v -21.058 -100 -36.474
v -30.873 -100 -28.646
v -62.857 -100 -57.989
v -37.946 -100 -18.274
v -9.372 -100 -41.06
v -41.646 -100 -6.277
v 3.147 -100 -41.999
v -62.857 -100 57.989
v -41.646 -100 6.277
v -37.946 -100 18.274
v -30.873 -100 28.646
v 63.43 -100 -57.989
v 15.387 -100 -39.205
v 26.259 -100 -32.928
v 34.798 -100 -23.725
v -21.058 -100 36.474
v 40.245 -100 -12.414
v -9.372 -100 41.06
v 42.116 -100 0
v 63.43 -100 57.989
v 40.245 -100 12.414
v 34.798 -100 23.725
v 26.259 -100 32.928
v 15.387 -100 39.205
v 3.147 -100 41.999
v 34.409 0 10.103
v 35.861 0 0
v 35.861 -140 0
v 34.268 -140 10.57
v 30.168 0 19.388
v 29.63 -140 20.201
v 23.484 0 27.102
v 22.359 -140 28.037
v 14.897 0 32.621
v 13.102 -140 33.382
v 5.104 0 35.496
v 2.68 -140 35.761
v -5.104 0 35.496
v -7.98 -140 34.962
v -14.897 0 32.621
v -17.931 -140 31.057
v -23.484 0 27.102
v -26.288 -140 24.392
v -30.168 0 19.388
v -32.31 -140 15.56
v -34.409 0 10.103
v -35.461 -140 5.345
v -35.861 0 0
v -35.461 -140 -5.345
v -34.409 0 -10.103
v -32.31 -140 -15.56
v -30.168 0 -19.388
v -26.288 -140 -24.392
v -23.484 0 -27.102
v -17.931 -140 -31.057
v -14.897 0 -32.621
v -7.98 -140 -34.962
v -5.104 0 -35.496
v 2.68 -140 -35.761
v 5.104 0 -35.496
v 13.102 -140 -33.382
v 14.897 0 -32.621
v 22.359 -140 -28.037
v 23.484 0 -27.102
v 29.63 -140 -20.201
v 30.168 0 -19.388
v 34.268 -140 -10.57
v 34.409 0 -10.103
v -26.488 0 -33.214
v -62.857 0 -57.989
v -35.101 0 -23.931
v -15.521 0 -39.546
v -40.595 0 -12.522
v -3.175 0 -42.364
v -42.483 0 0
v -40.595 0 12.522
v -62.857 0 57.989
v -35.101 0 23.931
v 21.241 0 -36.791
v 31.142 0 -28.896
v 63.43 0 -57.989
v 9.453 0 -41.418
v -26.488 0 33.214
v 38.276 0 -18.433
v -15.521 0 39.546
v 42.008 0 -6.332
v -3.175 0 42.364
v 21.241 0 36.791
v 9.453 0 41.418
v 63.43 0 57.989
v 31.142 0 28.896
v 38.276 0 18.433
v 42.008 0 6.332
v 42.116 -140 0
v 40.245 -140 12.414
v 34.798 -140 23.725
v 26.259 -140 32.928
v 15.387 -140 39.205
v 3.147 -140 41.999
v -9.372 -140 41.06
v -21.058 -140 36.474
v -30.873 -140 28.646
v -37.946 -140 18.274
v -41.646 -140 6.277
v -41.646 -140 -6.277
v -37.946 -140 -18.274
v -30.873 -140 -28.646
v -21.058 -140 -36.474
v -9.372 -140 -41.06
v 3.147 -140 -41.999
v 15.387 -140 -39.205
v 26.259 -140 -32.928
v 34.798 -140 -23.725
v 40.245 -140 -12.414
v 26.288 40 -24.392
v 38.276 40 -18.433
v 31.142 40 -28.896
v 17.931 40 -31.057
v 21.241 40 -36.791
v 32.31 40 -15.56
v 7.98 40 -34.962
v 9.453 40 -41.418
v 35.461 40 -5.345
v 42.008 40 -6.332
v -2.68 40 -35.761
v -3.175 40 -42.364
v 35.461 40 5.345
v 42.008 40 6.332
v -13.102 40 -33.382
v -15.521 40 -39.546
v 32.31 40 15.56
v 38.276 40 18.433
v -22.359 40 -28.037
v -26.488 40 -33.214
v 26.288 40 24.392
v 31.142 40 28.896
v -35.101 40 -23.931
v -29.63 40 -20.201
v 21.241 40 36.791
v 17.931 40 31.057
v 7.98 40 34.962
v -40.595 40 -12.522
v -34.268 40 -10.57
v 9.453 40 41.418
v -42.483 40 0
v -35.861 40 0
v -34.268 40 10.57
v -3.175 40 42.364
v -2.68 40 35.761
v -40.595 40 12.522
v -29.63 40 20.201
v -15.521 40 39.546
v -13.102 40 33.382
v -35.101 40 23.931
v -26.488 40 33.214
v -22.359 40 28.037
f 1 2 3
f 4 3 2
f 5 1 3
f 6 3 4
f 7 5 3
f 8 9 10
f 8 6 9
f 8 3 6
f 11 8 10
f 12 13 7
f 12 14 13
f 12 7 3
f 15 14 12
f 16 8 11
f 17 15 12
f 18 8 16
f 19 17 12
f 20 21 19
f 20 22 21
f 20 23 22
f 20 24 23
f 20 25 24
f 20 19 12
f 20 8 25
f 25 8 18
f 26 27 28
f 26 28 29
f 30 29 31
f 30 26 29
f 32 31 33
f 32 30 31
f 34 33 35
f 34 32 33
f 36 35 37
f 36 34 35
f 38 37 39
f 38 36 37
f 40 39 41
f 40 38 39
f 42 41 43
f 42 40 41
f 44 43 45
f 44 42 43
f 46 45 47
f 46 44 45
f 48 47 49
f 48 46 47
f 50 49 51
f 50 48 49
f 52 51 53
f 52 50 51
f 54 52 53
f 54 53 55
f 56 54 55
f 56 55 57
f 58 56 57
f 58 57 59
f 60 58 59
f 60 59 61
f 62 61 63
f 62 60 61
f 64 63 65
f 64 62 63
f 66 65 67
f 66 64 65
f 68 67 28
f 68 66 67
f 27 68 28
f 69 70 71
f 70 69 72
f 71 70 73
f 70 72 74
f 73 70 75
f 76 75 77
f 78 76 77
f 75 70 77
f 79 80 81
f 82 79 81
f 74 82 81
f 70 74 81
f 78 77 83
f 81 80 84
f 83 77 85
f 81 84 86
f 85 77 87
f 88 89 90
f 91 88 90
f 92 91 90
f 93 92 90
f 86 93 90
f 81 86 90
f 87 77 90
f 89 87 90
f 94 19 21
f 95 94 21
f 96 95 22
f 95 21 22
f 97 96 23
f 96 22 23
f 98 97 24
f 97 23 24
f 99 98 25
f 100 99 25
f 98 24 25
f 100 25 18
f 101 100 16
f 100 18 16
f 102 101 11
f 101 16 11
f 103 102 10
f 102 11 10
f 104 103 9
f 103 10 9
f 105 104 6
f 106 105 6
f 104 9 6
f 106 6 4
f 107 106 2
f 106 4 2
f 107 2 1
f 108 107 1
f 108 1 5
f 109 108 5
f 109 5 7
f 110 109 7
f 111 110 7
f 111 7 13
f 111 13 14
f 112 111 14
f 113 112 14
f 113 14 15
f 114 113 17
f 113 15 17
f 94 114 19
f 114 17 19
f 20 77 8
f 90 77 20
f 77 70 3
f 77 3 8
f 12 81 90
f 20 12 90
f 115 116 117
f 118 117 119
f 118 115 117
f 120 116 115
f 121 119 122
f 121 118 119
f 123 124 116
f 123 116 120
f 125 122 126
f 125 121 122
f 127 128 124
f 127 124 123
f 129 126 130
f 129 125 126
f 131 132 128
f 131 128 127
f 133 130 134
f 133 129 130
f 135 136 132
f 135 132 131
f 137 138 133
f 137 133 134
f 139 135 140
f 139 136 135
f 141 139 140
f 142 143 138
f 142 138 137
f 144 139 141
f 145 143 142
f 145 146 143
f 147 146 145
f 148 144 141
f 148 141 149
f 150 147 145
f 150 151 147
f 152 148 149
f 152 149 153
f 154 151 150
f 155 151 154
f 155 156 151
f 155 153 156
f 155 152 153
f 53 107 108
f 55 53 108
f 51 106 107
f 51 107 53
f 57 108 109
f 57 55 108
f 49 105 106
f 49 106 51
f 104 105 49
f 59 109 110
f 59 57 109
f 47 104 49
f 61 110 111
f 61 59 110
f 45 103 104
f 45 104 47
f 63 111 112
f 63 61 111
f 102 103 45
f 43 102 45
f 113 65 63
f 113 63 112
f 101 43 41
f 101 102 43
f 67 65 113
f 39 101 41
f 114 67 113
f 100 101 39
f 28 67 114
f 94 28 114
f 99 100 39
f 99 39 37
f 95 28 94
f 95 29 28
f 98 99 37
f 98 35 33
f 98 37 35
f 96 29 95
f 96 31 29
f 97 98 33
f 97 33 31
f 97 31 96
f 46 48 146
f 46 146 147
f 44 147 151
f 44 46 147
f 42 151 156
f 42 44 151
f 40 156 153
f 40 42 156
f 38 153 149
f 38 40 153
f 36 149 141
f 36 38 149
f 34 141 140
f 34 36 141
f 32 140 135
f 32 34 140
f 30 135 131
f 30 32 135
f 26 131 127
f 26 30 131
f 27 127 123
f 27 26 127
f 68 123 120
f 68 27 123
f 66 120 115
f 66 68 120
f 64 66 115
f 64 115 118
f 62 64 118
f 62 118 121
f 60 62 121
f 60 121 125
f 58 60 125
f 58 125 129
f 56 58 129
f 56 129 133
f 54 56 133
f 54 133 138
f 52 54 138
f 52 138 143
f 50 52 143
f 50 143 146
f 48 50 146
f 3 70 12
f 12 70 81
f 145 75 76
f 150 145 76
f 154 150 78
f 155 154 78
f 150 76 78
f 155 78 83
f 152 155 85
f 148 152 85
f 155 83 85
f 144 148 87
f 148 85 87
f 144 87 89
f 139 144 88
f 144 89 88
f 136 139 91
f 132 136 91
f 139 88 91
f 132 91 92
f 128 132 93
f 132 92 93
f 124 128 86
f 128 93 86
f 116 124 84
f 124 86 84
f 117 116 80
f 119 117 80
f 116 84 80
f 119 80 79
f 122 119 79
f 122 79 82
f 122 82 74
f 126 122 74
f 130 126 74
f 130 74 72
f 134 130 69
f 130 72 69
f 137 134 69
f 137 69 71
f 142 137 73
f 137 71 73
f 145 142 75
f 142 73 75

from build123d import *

# Parameters (mm, degrees)
F0_W     = 126.286372
F0_H     = 115.97728
F0_R     = 35.861257
F1_DEPTH = 100
F2_R     = 42.116392
F2_R_2   = 35.861257
F3_DEPTH = 40
F4_R     = 42.482799
F4_R_2   = 35.861257
F5_DEPTH = 40


with BuildPart() as f1:
    # F0 (on Front) → F1 (new body)
    with BuildSketch(Plane.XZ):
        with Locations((0.286363, 0)):
            Rectangle(F0_W, F0_H)
        Circle(F0_R, mode=Mode.SUBTRACT)
    extrude(amount=F1_DEPTH)

    # F2 (on face) → F3 (join)
    with BuildSketch(Plane.XZ.offset(100)):
        Circle(F2_R)
        Circle(F2_R_2, mode=Mode.SUBTRACT)
    extrude(amount=F3_DEPTH)

    # F4 (on face) → F5 (join)
    with BuildSketch(Plane(origin=(0, 0, 0), x_dir=(-1, 0, 0), z_dir=(0, 1, 0))):
        Circle(F4_R)
        Circle(F4_R_2, mode=Mode.SUBTRACT)
    extrude(amount=F5_DEPTH)


solid = f1.part
